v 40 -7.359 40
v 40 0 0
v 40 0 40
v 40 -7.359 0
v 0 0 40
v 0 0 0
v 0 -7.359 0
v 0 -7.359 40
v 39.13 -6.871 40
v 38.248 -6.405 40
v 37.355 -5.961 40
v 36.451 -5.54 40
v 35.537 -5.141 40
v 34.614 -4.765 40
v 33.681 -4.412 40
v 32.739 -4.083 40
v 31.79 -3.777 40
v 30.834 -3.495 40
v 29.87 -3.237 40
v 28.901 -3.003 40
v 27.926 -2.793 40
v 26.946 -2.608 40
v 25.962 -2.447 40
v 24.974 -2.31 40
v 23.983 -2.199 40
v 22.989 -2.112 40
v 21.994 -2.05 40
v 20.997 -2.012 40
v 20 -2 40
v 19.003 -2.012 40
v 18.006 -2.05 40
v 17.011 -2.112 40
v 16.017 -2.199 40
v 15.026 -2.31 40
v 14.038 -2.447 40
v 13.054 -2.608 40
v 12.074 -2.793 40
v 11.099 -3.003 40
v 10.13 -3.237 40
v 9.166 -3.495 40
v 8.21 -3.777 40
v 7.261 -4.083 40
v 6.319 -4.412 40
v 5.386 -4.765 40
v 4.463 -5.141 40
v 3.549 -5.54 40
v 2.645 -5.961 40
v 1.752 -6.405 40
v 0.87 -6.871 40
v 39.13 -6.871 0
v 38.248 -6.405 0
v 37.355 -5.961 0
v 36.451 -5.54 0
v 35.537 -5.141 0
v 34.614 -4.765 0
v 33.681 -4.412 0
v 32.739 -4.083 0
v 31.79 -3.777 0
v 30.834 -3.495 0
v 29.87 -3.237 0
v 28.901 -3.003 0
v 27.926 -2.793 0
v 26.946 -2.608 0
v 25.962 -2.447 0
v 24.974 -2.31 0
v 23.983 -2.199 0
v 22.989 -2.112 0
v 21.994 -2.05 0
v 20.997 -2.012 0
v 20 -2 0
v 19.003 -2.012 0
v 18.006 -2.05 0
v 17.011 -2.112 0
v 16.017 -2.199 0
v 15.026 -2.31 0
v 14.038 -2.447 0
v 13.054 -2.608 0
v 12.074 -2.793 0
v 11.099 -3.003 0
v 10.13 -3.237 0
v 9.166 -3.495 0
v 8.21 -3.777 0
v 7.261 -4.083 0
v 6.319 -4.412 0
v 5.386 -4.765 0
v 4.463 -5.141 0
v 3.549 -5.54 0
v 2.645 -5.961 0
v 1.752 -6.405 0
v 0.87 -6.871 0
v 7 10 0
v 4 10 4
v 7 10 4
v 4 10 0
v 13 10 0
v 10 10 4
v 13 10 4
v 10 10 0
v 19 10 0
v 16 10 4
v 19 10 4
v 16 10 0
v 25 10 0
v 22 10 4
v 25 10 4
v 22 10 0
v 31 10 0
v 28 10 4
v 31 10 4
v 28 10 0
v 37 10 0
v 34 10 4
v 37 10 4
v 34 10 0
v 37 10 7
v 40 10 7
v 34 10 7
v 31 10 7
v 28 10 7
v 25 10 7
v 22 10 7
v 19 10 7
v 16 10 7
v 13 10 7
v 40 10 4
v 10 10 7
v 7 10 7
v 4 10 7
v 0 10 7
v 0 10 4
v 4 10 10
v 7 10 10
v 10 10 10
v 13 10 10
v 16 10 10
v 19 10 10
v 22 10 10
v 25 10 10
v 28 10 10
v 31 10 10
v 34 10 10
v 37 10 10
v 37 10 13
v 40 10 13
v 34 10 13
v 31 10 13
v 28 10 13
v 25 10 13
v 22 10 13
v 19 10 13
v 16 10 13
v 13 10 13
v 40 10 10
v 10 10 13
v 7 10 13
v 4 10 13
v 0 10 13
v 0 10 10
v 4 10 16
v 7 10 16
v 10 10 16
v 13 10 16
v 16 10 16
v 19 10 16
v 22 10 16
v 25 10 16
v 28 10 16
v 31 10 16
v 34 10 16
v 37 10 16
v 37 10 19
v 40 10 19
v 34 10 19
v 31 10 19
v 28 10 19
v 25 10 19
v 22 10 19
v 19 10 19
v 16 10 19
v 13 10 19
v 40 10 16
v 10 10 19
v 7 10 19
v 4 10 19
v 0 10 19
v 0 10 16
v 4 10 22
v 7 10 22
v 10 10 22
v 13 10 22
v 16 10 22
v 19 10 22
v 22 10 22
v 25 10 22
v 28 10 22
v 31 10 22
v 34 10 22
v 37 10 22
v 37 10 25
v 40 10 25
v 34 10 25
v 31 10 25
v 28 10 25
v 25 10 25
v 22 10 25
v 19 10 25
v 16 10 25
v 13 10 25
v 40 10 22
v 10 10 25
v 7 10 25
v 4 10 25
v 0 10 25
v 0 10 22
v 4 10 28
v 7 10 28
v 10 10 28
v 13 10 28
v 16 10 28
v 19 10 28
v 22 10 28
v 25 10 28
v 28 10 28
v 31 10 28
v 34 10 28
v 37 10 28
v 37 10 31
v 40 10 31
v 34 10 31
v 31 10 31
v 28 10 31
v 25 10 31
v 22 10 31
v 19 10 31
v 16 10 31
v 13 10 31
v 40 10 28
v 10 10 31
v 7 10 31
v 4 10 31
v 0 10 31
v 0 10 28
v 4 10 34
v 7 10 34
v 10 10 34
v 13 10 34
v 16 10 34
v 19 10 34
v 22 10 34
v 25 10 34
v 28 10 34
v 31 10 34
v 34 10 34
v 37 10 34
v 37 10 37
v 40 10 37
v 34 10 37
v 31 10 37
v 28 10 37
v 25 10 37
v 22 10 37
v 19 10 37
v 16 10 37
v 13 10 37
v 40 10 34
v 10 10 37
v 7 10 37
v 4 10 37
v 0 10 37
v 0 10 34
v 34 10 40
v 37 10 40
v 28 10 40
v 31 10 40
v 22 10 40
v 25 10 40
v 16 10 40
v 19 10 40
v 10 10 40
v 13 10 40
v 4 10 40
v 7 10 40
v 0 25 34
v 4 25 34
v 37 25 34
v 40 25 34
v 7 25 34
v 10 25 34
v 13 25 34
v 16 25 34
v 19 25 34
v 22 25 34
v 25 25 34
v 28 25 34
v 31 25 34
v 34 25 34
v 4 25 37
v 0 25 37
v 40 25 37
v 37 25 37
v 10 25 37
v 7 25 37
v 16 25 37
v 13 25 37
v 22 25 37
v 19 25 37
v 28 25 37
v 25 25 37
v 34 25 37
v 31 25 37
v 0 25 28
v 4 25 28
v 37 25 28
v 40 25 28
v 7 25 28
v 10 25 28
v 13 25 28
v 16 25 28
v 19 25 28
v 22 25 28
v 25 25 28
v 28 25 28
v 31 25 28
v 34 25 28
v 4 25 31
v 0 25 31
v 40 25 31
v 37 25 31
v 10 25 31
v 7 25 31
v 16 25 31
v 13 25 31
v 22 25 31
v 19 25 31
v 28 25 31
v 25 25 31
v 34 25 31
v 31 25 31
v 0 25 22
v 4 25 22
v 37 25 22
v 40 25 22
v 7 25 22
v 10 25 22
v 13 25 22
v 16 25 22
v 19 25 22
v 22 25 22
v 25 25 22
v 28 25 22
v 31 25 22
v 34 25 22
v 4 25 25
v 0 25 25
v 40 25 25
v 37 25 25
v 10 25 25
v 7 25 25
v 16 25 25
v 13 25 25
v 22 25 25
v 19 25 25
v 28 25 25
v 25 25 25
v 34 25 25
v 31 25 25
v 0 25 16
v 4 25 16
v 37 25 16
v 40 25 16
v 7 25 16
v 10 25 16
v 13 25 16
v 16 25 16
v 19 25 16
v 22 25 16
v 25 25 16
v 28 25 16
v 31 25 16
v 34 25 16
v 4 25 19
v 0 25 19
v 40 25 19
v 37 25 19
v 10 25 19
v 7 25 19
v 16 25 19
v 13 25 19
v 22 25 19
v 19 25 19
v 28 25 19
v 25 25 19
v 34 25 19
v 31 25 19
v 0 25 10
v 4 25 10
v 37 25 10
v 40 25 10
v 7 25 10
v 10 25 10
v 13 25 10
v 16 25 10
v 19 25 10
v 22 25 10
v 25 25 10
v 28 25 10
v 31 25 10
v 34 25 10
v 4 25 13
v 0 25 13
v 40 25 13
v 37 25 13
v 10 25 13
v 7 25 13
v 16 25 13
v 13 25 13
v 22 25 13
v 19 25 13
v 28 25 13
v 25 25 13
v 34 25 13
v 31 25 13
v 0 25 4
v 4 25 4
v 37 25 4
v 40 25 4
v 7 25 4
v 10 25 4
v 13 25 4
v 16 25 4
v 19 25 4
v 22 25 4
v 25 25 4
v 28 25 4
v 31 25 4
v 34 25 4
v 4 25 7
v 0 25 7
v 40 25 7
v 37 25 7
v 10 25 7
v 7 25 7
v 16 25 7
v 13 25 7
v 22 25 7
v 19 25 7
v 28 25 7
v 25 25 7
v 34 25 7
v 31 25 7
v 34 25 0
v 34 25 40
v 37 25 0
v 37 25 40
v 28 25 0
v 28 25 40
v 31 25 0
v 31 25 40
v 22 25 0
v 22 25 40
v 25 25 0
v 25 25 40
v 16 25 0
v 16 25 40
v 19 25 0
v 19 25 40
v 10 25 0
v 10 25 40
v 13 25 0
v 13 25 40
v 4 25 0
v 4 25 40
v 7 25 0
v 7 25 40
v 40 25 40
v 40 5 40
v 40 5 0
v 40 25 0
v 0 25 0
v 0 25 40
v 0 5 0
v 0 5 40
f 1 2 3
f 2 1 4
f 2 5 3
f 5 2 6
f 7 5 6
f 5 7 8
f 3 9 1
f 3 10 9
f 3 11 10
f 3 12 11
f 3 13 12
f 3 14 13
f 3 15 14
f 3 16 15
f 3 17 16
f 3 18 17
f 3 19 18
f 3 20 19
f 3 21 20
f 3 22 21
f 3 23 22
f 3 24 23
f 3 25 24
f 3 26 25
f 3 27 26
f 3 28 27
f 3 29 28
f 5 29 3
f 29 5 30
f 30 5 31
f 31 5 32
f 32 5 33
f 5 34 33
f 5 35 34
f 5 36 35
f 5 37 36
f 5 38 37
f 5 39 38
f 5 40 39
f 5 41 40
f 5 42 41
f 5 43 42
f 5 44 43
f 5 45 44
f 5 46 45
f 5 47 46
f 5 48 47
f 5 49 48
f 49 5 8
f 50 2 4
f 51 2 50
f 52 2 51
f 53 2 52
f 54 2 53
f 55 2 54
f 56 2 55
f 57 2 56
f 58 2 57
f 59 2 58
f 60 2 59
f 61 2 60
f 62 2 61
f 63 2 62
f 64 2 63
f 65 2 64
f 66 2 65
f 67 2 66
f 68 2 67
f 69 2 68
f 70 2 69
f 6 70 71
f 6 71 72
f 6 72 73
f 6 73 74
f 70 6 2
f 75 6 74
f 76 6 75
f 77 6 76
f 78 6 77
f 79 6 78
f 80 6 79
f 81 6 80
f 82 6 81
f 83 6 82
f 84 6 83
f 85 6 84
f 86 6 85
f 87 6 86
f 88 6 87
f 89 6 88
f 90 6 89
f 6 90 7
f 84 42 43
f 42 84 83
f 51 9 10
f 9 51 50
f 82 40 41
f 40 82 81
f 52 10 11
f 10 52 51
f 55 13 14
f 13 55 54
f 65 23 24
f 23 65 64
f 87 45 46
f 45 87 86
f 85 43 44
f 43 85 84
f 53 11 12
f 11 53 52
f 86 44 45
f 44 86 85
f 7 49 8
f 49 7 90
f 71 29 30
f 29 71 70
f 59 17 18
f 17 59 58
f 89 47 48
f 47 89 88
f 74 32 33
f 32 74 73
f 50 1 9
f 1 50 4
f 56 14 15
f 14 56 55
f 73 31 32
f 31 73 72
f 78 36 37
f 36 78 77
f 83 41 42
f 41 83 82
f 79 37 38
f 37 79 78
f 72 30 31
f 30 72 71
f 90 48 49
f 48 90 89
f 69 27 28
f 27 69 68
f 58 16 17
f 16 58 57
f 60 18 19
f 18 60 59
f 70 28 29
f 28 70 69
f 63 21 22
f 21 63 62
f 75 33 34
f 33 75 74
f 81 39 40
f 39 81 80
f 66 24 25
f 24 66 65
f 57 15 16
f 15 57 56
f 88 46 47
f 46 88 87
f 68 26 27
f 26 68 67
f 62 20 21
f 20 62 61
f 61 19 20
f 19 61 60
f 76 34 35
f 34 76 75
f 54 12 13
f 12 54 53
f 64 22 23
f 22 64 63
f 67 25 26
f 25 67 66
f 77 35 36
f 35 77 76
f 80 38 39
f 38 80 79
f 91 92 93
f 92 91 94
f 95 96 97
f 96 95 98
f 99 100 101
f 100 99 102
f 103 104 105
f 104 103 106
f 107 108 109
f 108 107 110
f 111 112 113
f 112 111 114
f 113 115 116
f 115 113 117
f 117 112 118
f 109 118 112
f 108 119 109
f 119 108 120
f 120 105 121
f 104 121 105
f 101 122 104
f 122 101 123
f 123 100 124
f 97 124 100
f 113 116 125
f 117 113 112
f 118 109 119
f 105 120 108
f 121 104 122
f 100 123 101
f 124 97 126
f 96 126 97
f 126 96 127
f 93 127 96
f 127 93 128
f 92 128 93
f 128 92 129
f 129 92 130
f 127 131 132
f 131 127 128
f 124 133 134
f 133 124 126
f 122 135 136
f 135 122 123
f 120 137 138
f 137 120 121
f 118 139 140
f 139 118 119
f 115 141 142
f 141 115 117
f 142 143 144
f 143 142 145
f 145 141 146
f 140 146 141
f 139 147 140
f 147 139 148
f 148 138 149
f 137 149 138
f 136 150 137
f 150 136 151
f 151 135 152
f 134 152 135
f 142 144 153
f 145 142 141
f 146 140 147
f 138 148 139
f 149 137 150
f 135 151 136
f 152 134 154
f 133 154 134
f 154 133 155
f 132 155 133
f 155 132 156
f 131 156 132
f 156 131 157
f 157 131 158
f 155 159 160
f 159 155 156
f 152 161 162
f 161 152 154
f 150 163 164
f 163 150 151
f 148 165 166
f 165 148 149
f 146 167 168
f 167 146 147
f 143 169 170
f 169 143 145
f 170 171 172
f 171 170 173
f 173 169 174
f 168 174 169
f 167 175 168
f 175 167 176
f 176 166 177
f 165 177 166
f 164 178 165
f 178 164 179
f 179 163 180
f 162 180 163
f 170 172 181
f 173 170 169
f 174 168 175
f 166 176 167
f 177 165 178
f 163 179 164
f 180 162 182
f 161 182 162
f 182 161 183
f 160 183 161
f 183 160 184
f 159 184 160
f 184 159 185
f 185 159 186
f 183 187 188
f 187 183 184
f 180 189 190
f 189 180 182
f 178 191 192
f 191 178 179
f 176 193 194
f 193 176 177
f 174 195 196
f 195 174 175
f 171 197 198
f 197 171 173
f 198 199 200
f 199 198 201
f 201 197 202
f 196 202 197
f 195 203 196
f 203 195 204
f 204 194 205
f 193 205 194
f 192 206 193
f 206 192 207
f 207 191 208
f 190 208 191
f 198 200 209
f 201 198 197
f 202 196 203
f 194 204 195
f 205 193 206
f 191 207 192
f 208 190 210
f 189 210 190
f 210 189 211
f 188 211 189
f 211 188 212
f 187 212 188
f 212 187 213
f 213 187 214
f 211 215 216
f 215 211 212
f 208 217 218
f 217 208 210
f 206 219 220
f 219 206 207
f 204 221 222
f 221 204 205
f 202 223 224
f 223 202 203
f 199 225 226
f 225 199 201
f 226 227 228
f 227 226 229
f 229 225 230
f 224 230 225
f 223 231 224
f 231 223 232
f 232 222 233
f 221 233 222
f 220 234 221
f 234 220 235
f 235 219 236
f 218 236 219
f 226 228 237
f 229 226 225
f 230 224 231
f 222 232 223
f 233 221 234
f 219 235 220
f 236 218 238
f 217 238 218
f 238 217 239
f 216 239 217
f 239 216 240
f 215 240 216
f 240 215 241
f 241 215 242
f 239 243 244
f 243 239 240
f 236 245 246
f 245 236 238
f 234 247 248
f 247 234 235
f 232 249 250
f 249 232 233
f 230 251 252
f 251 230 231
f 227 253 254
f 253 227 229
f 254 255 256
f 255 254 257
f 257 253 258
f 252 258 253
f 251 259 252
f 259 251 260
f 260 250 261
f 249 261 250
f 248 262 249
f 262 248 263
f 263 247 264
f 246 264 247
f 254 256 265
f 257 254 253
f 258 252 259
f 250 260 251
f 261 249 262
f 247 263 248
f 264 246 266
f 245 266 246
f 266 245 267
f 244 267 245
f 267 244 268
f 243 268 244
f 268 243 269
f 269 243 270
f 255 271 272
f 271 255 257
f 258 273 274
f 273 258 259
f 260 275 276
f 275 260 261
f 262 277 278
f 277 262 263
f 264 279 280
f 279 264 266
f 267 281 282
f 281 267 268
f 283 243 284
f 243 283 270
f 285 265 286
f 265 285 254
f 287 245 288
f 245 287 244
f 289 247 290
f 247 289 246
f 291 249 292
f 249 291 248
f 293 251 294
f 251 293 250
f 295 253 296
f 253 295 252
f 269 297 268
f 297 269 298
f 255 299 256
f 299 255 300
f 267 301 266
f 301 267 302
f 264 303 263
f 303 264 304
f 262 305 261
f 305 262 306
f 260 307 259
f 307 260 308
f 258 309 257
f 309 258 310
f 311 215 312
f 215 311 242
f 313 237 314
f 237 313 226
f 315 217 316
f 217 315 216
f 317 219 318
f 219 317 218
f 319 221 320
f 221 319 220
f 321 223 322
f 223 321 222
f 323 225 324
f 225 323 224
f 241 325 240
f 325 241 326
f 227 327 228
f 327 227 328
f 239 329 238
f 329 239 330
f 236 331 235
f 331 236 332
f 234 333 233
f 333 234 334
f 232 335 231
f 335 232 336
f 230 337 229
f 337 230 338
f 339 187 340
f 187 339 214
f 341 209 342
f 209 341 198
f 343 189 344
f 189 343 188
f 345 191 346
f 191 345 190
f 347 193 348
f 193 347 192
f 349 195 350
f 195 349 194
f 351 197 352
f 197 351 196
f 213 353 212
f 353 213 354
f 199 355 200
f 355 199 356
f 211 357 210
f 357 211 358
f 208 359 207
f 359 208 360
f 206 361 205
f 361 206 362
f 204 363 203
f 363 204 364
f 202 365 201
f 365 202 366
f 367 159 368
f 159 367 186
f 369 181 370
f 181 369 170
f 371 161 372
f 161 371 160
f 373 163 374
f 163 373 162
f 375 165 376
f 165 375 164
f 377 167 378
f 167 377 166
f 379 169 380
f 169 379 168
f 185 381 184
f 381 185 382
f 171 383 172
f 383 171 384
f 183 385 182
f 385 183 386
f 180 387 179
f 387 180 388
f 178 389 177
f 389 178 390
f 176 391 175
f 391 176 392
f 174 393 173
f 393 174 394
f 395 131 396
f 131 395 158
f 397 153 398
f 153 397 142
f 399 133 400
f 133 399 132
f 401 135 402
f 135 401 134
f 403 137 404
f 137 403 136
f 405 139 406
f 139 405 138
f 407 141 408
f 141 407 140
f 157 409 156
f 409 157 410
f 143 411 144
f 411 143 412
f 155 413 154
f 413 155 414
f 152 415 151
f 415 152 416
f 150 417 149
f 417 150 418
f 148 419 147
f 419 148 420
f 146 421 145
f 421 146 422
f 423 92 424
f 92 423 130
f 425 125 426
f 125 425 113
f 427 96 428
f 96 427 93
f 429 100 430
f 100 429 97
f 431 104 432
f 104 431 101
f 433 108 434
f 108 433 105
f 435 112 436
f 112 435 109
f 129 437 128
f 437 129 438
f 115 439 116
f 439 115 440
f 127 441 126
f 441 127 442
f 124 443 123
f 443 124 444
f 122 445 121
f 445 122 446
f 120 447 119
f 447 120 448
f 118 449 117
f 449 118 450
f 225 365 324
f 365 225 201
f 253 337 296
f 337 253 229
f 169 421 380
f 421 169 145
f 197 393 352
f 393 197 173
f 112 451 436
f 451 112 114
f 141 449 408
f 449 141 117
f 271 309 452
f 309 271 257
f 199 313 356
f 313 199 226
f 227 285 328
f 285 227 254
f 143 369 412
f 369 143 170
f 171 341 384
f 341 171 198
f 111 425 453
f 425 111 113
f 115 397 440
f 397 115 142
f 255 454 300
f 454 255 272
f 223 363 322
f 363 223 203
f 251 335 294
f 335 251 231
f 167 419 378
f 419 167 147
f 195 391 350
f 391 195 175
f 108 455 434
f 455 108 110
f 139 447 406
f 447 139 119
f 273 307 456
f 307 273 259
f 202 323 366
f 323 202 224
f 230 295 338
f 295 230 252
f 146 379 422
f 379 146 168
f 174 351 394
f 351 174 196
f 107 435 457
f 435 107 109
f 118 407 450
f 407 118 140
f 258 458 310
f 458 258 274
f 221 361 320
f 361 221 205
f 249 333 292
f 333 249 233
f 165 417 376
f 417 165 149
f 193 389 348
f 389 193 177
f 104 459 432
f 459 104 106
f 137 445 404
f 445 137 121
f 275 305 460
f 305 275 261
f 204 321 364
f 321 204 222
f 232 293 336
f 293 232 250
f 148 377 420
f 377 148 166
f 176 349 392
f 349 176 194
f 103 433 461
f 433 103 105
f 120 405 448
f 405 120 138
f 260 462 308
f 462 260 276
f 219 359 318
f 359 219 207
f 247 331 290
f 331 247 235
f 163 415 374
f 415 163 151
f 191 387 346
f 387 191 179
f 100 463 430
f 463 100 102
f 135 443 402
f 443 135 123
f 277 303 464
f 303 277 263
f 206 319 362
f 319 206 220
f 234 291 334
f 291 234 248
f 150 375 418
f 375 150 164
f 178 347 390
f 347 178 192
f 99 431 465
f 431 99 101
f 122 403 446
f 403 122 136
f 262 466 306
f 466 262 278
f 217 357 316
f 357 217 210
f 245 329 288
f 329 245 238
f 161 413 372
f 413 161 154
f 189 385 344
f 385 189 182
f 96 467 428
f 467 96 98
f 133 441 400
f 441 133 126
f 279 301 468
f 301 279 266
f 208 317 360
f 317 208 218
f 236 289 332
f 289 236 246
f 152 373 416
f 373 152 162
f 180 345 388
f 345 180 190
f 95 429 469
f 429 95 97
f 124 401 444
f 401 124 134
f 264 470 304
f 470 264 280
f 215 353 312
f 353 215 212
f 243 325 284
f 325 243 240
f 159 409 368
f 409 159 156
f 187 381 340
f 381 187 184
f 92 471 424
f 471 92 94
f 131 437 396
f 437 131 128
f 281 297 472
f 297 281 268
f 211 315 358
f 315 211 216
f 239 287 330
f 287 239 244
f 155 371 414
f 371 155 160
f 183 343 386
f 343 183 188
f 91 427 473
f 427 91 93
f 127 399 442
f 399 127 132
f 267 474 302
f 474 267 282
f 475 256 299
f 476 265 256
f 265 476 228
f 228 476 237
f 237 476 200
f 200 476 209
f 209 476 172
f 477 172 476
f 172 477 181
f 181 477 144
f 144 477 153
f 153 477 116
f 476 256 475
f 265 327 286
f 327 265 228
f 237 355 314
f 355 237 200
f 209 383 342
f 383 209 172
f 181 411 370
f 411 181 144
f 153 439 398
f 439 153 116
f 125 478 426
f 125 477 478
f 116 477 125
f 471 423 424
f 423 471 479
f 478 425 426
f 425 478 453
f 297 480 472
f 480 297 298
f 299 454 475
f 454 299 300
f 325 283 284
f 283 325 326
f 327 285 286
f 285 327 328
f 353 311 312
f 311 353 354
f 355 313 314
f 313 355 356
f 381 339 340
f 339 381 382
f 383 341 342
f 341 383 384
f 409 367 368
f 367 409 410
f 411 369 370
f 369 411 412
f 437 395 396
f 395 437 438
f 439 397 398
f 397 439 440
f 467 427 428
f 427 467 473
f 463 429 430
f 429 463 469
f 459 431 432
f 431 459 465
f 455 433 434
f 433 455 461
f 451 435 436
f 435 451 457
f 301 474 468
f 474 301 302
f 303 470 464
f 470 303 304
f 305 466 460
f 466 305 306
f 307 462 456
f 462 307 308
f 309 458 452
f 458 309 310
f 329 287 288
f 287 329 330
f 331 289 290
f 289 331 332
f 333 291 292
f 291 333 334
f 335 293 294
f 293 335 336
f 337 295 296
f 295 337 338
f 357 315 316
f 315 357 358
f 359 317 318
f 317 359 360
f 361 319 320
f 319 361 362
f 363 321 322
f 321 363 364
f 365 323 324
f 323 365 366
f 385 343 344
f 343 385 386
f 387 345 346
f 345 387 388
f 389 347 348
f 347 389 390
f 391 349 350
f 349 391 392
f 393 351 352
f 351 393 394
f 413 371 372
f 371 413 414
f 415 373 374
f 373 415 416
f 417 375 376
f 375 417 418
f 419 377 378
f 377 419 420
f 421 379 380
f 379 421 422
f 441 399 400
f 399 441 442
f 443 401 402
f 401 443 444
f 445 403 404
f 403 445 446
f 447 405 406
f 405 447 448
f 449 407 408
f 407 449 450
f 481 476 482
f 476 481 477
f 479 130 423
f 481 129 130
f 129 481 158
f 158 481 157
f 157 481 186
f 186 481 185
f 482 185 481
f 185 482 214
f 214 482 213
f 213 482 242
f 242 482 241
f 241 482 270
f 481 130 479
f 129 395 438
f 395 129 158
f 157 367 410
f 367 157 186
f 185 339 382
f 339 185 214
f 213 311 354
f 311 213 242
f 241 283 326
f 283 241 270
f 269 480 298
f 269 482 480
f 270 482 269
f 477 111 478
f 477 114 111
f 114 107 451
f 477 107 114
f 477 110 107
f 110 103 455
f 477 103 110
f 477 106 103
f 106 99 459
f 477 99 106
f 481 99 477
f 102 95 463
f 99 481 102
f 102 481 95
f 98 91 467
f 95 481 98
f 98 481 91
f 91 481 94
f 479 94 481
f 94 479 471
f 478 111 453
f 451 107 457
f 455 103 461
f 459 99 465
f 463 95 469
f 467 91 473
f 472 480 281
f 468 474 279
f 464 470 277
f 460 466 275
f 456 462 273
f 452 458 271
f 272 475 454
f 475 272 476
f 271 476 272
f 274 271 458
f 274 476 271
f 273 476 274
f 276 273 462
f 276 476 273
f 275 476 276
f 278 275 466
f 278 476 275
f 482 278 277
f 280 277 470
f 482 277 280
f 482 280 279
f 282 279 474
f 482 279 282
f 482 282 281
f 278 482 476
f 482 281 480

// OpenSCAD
echo(version=version());

// Values are in millimeters

$fa=1;
$fs=1;
////////////////////////////
// Adjust these for cup
cupDiameter = 80;

TEGsize = 40; 

////////////////////////////
// Plate to connect cup to TEG
rotate([90,0,0])
difference() {
	cube(size=[TEGsize,TEGsize,10]);
	
	translate([TEGsize/2, -2.5, (cupDiameter/2)+2])
		rotate([-90,0,0])
			cylinder(h=TEGsize+5, d=cupDiameter);
}

////////////////////////////
// Cooling fins.  Might just find a CPU heatsink instead
finThick=3;
finGap=3;
module FinGrid() {
	for(i=[finGap: finGap+finThick: TEGsize-finGap]) {
		translate([-1,i,5])
			cube(size=[TEGsize+2,finThick,16]);
	}
}
translate([0,5, TEGsize])
rotate([-90,0,0])
difference() {
	cube(size=[TEGsize,TEGsize,20]);

	FinGrid();
	translate([TEGsize,0,0]) rotate([0, 0, 90]) FinGrid();
}

//  vim: set sw=4 ts=4 :
